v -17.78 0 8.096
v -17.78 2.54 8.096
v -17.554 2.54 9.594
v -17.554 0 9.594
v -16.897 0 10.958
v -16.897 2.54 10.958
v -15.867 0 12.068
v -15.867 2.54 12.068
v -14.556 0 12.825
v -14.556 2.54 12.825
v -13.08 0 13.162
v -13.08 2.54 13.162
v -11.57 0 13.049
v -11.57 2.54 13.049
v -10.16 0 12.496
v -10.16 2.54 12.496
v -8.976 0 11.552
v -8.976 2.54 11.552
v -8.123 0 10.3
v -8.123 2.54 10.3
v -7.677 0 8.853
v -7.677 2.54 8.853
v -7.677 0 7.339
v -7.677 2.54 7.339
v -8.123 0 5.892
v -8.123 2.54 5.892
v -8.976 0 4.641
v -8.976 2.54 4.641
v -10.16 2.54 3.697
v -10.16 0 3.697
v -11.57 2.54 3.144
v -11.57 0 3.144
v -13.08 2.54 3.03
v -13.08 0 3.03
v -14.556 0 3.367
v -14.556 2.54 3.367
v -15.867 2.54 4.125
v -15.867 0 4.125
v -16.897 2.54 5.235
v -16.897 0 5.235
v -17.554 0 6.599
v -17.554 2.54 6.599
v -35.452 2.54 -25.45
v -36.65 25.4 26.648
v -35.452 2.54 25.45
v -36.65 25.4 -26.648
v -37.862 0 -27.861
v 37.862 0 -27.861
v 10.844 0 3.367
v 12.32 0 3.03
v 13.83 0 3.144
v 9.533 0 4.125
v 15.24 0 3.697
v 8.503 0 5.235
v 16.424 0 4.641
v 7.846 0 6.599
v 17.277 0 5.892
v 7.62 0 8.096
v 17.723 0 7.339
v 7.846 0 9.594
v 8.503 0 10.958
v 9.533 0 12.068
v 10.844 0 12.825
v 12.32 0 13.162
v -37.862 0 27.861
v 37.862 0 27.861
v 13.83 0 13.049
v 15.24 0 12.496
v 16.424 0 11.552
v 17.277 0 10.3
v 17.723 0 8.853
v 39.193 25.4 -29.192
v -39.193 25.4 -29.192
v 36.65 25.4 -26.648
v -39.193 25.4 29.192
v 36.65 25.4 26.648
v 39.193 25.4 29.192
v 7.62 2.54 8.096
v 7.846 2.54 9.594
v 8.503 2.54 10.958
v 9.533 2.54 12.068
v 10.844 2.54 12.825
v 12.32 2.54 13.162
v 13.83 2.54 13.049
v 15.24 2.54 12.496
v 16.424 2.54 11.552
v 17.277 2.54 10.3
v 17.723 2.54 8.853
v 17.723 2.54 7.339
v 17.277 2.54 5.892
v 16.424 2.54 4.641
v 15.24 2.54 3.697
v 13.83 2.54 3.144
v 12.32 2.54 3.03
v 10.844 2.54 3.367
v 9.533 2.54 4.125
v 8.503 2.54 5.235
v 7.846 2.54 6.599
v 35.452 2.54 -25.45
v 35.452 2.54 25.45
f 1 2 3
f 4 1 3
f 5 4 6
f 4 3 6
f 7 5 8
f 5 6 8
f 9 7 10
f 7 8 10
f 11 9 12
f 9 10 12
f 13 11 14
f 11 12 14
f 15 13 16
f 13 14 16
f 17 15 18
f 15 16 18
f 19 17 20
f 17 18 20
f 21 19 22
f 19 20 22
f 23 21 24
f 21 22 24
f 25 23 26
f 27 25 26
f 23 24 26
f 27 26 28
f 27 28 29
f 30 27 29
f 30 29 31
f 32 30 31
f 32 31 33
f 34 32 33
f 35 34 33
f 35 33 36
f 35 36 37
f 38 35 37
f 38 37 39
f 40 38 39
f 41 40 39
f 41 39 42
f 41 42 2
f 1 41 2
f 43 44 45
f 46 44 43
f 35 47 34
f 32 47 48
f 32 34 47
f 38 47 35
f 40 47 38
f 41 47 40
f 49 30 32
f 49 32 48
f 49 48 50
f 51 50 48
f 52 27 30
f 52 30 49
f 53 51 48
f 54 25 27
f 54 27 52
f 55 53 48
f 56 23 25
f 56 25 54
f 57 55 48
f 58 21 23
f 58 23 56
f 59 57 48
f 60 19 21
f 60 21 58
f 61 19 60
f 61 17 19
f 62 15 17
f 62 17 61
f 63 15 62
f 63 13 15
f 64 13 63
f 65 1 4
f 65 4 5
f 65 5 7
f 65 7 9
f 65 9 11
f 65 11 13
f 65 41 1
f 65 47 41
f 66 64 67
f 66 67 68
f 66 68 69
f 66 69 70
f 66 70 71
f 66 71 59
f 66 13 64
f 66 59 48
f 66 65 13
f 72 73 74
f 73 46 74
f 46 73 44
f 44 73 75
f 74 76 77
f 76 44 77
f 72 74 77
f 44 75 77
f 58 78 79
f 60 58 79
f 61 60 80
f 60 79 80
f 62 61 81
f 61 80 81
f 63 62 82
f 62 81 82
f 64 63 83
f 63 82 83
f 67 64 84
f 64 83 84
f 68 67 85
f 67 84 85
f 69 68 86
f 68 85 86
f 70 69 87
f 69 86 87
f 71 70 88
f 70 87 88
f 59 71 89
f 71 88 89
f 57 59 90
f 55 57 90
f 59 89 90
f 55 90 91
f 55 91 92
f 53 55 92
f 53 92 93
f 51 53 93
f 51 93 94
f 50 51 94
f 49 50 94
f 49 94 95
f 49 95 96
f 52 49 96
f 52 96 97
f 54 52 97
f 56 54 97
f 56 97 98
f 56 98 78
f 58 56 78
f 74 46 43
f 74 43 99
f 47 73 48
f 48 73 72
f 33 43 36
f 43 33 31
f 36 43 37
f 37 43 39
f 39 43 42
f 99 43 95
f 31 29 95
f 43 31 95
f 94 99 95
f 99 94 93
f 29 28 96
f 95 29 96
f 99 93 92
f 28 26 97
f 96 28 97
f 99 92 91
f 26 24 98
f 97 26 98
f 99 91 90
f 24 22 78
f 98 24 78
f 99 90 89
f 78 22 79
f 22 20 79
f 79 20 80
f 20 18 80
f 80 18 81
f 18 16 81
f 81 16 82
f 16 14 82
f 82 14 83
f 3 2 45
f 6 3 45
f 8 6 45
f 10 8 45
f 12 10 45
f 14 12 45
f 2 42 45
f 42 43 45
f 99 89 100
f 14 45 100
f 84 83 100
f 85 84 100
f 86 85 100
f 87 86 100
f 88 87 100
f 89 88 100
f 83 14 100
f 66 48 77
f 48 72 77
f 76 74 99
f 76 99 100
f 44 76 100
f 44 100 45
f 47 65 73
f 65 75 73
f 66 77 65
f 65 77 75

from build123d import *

# Parameters (mm, degrees)
F0_W     = 75.7237523794
F0_H     = 55.7212531567
F1_DEPTH = 25.4
F1_TAPER = -3
F2_T     = -2.54
F3_R     = 5.08
F4_DEPTH = 2.5410001


# Not quite as in the source:
# - a feature of the source that left no trace in its solid (it failed there, or was rolled back) is left out


with BuildPart() as f1:
    # F0 (on Front) → F1 (new body)
    with BuildSketch(Plane.XZ):
        Rectangle(F0_W, F0_H)
    extrude(amount=-F1_DEPTH, taper=F1_TAPER)

    # F2
    f2_openings = [f1.faces().sort_by_distance(p)[0] for p in [
        (0, 25.4, 0),
    ]]
    offset(amount=F2_T, openings=f2_openings)

    # F3 (on face) → F4 (cut, through all)
    with BuildSketch(Plane(origin=(0, 2.54, 0), x_dir=(-1, 0, 0), z_dir=(0, 1, 0))):
        with Locations((12.7, 8.0962497741)):
            Circle(F3_R)
        with Locations((-12.7, 8.0962497741)):
            Circle(F3_R)
    extrude(amount=-F4_DEPTH, mode=Mode.SUBTRACT)


solid = f1.part
